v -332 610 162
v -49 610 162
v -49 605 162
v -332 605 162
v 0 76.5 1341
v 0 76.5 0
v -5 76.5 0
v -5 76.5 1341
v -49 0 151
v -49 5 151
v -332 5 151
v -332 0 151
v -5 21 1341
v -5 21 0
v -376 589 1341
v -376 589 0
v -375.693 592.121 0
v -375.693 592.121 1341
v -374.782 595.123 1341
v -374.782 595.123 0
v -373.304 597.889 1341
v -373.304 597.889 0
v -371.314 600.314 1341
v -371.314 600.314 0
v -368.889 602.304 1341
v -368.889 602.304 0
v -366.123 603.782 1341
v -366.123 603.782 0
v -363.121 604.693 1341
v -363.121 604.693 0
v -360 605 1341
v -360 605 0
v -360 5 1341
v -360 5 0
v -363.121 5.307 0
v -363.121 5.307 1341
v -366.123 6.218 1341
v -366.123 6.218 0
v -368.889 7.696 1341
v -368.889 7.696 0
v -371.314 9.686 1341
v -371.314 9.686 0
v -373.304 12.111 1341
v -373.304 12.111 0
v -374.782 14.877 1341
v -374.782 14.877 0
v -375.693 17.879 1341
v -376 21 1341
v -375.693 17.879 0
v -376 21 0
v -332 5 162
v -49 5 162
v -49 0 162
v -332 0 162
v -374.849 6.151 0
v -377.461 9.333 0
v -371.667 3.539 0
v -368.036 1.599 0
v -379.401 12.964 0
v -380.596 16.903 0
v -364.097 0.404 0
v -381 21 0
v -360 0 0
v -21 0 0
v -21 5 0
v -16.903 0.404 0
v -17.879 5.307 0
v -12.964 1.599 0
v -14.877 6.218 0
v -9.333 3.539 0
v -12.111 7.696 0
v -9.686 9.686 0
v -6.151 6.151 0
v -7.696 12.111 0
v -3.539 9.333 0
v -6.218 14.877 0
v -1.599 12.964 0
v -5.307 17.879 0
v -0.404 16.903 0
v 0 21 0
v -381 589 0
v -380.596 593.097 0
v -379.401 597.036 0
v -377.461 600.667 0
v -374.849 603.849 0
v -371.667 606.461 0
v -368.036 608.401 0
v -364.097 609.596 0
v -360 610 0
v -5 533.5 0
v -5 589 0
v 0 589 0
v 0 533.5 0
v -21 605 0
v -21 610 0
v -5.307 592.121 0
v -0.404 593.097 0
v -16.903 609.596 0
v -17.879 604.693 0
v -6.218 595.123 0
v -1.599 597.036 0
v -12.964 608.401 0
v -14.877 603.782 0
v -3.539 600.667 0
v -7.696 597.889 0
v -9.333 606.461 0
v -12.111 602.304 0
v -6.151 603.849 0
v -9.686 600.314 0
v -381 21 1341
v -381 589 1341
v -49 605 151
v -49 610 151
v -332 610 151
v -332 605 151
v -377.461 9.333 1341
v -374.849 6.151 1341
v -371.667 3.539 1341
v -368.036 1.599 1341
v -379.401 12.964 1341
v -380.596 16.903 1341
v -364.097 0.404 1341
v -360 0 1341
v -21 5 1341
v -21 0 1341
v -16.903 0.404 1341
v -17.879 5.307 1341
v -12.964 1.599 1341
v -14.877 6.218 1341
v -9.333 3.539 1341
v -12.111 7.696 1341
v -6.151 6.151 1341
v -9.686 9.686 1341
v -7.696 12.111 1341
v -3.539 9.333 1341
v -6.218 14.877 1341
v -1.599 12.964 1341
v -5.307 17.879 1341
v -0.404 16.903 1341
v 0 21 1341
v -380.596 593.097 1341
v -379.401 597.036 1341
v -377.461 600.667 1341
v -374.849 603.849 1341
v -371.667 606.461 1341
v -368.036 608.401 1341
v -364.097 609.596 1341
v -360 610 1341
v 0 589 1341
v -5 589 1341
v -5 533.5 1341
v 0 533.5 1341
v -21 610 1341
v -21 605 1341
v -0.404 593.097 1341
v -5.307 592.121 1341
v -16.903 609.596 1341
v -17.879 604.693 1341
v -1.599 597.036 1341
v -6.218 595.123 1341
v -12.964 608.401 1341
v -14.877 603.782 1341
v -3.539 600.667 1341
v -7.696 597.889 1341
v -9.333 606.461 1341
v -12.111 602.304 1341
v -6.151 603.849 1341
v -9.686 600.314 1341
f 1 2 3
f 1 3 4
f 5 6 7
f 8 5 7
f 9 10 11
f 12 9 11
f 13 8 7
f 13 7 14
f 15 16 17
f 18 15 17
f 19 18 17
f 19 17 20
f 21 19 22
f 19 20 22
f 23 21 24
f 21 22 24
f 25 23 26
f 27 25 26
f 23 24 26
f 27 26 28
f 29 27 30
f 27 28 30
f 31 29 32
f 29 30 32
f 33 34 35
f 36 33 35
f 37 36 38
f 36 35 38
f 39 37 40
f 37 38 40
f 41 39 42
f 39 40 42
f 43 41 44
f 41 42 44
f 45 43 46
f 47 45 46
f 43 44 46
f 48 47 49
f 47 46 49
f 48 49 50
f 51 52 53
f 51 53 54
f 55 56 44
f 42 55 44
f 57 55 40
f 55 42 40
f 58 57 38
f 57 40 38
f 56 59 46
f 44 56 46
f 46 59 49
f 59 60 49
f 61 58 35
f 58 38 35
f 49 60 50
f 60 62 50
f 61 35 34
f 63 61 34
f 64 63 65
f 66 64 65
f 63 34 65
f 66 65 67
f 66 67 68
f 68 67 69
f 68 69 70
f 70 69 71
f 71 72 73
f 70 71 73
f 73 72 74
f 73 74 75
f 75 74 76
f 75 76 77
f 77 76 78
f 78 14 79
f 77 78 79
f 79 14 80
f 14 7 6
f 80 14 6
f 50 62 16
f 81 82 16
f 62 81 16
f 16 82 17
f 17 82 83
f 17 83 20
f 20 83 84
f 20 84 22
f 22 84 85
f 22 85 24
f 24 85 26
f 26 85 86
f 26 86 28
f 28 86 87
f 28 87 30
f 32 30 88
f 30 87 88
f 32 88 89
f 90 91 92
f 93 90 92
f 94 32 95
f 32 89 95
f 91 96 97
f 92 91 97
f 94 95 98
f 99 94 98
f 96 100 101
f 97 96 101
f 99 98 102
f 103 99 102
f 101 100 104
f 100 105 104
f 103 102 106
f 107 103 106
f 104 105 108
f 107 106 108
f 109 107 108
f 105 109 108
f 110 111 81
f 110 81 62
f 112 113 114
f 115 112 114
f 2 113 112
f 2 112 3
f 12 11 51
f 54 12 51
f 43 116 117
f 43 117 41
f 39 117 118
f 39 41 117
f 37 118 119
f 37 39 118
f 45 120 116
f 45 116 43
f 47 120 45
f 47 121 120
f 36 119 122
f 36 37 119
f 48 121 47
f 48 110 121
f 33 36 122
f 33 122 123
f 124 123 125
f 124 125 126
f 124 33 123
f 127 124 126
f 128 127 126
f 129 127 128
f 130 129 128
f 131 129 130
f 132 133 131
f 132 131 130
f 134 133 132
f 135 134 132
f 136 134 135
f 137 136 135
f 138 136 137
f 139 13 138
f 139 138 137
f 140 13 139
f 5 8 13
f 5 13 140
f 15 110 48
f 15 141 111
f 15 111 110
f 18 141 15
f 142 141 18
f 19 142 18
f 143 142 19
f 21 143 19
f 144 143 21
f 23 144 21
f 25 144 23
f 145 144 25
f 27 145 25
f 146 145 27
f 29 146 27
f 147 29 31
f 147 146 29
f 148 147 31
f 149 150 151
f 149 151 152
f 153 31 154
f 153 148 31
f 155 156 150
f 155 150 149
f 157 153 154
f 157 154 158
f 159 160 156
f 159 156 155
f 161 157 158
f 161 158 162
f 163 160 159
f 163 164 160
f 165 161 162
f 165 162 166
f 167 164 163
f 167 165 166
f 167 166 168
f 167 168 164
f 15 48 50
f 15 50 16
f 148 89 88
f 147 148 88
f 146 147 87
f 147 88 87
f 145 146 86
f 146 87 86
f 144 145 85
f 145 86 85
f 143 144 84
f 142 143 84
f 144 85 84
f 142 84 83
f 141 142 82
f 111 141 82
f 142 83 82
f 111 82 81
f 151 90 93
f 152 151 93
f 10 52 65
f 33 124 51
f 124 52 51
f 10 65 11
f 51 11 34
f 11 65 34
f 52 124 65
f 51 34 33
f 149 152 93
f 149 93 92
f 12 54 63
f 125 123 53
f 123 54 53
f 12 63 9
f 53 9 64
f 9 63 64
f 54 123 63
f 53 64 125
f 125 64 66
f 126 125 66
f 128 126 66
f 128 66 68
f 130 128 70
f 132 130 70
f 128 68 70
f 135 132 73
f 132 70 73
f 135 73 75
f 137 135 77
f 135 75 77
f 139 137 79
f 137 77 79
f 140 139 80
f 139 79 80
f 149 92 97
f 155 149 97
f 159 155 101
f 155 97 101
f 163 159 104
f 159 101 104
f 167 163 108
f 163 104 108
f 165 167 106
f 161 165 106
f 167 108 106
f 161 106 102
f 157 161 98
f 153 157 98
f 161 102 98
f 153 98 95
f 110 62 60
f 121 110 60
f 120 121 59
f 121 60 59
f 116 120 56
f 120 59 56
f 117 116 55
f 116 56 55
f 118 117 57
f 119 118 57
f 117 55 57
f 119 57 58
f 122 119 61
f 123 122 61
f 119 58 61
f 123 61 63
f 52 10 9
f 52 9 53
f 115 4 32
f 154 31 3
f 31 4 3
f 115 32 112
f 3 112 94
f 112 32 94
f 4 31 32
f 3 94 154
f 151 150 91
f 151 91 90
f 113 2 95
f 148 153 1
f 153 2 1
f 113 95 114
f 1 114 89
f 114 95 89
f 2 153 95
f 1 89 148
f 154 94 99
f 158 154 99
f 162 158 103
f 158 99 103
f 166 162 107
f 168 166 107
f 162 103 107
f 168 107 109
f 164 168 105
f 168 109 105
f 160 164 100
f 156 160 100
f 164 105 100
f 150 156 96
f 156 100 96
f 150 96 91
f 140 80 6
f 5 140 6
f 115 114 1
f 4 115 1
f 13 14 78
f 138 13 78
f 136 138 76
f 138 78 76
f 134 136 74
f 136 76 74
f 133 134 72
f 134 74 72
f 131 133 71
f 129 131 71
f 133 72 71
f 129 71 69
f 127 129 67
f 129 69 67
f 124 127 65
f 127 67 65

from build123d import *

# Parameters (mm, degrees)
F1_DEPTH = 1341
F2_W     = 283
F2_H     = 11
F3_DEPTH = 610


with BuildPart() as f1:
    # F0 (on Top) → F1 (new body)
    with BuildSketch(Plane.XY):
        with BuildLine():
            Line((-360, 0), (-21, 0))
            ThreePointArc((-21, 0), (-6.150758, 6.150758), (0, 21))
            Line((0, 21), (0, 76.5))
            Line((0, 76.5), (-5, 76.5))
            Line((-5, 76.5), (-5, 21))
            ThreePointArc((-5, 21), (-9.686292, 9.686292), (-21, 5))
            Line((-21, 5), (-360, 5))
            ThreePointArc((-360, 5), (-371.313708, 9.686292), (-376, 21))
            Line((-376, 21), (-376, 589))
            ThreePointArc((-376, 589), (-371.313708, 600.313708), (-360, 605))
            Line((-360, 605), (-21, 605))
            ThreePointArc((-21, 605), (-9.686292, 600.313708), (-5, 589))
            Line((-5, 589), (-5, 533.5))
            Line((-5, 533.5), (0, 533.5))
            Line((0, 533.5), (0, 589))
            ThreePointArc((0, 589), (-6.150758, 603.849242), (-21, 610))
            Line((-21, 610), (-360, 610))
            ThreePointArc((-360, 610), (-374.849242, 603.849242), (-381, 589))
            Line((-381, 589), (-381, 21))
            ThreePointArc((-381, 21), (-374.849242, 6.150758), (-360, 0))
        make_face()
    extrude(amount=F1_DEPTH)

    # F2 (on face) → F3 (cut, through all)
    with BuildSketch(Plane(origin=(0, 610, 0), x_dir=(-1, 0, 0), z_dir=(0, 1, 0))):
        with Locations((190.5, 156.5)):
            Rectangle(F2_W, F2_H)
    extrude(amount=-F3_DEPTH, mode=Mode.SUBTRACT)


solid = f1.part
